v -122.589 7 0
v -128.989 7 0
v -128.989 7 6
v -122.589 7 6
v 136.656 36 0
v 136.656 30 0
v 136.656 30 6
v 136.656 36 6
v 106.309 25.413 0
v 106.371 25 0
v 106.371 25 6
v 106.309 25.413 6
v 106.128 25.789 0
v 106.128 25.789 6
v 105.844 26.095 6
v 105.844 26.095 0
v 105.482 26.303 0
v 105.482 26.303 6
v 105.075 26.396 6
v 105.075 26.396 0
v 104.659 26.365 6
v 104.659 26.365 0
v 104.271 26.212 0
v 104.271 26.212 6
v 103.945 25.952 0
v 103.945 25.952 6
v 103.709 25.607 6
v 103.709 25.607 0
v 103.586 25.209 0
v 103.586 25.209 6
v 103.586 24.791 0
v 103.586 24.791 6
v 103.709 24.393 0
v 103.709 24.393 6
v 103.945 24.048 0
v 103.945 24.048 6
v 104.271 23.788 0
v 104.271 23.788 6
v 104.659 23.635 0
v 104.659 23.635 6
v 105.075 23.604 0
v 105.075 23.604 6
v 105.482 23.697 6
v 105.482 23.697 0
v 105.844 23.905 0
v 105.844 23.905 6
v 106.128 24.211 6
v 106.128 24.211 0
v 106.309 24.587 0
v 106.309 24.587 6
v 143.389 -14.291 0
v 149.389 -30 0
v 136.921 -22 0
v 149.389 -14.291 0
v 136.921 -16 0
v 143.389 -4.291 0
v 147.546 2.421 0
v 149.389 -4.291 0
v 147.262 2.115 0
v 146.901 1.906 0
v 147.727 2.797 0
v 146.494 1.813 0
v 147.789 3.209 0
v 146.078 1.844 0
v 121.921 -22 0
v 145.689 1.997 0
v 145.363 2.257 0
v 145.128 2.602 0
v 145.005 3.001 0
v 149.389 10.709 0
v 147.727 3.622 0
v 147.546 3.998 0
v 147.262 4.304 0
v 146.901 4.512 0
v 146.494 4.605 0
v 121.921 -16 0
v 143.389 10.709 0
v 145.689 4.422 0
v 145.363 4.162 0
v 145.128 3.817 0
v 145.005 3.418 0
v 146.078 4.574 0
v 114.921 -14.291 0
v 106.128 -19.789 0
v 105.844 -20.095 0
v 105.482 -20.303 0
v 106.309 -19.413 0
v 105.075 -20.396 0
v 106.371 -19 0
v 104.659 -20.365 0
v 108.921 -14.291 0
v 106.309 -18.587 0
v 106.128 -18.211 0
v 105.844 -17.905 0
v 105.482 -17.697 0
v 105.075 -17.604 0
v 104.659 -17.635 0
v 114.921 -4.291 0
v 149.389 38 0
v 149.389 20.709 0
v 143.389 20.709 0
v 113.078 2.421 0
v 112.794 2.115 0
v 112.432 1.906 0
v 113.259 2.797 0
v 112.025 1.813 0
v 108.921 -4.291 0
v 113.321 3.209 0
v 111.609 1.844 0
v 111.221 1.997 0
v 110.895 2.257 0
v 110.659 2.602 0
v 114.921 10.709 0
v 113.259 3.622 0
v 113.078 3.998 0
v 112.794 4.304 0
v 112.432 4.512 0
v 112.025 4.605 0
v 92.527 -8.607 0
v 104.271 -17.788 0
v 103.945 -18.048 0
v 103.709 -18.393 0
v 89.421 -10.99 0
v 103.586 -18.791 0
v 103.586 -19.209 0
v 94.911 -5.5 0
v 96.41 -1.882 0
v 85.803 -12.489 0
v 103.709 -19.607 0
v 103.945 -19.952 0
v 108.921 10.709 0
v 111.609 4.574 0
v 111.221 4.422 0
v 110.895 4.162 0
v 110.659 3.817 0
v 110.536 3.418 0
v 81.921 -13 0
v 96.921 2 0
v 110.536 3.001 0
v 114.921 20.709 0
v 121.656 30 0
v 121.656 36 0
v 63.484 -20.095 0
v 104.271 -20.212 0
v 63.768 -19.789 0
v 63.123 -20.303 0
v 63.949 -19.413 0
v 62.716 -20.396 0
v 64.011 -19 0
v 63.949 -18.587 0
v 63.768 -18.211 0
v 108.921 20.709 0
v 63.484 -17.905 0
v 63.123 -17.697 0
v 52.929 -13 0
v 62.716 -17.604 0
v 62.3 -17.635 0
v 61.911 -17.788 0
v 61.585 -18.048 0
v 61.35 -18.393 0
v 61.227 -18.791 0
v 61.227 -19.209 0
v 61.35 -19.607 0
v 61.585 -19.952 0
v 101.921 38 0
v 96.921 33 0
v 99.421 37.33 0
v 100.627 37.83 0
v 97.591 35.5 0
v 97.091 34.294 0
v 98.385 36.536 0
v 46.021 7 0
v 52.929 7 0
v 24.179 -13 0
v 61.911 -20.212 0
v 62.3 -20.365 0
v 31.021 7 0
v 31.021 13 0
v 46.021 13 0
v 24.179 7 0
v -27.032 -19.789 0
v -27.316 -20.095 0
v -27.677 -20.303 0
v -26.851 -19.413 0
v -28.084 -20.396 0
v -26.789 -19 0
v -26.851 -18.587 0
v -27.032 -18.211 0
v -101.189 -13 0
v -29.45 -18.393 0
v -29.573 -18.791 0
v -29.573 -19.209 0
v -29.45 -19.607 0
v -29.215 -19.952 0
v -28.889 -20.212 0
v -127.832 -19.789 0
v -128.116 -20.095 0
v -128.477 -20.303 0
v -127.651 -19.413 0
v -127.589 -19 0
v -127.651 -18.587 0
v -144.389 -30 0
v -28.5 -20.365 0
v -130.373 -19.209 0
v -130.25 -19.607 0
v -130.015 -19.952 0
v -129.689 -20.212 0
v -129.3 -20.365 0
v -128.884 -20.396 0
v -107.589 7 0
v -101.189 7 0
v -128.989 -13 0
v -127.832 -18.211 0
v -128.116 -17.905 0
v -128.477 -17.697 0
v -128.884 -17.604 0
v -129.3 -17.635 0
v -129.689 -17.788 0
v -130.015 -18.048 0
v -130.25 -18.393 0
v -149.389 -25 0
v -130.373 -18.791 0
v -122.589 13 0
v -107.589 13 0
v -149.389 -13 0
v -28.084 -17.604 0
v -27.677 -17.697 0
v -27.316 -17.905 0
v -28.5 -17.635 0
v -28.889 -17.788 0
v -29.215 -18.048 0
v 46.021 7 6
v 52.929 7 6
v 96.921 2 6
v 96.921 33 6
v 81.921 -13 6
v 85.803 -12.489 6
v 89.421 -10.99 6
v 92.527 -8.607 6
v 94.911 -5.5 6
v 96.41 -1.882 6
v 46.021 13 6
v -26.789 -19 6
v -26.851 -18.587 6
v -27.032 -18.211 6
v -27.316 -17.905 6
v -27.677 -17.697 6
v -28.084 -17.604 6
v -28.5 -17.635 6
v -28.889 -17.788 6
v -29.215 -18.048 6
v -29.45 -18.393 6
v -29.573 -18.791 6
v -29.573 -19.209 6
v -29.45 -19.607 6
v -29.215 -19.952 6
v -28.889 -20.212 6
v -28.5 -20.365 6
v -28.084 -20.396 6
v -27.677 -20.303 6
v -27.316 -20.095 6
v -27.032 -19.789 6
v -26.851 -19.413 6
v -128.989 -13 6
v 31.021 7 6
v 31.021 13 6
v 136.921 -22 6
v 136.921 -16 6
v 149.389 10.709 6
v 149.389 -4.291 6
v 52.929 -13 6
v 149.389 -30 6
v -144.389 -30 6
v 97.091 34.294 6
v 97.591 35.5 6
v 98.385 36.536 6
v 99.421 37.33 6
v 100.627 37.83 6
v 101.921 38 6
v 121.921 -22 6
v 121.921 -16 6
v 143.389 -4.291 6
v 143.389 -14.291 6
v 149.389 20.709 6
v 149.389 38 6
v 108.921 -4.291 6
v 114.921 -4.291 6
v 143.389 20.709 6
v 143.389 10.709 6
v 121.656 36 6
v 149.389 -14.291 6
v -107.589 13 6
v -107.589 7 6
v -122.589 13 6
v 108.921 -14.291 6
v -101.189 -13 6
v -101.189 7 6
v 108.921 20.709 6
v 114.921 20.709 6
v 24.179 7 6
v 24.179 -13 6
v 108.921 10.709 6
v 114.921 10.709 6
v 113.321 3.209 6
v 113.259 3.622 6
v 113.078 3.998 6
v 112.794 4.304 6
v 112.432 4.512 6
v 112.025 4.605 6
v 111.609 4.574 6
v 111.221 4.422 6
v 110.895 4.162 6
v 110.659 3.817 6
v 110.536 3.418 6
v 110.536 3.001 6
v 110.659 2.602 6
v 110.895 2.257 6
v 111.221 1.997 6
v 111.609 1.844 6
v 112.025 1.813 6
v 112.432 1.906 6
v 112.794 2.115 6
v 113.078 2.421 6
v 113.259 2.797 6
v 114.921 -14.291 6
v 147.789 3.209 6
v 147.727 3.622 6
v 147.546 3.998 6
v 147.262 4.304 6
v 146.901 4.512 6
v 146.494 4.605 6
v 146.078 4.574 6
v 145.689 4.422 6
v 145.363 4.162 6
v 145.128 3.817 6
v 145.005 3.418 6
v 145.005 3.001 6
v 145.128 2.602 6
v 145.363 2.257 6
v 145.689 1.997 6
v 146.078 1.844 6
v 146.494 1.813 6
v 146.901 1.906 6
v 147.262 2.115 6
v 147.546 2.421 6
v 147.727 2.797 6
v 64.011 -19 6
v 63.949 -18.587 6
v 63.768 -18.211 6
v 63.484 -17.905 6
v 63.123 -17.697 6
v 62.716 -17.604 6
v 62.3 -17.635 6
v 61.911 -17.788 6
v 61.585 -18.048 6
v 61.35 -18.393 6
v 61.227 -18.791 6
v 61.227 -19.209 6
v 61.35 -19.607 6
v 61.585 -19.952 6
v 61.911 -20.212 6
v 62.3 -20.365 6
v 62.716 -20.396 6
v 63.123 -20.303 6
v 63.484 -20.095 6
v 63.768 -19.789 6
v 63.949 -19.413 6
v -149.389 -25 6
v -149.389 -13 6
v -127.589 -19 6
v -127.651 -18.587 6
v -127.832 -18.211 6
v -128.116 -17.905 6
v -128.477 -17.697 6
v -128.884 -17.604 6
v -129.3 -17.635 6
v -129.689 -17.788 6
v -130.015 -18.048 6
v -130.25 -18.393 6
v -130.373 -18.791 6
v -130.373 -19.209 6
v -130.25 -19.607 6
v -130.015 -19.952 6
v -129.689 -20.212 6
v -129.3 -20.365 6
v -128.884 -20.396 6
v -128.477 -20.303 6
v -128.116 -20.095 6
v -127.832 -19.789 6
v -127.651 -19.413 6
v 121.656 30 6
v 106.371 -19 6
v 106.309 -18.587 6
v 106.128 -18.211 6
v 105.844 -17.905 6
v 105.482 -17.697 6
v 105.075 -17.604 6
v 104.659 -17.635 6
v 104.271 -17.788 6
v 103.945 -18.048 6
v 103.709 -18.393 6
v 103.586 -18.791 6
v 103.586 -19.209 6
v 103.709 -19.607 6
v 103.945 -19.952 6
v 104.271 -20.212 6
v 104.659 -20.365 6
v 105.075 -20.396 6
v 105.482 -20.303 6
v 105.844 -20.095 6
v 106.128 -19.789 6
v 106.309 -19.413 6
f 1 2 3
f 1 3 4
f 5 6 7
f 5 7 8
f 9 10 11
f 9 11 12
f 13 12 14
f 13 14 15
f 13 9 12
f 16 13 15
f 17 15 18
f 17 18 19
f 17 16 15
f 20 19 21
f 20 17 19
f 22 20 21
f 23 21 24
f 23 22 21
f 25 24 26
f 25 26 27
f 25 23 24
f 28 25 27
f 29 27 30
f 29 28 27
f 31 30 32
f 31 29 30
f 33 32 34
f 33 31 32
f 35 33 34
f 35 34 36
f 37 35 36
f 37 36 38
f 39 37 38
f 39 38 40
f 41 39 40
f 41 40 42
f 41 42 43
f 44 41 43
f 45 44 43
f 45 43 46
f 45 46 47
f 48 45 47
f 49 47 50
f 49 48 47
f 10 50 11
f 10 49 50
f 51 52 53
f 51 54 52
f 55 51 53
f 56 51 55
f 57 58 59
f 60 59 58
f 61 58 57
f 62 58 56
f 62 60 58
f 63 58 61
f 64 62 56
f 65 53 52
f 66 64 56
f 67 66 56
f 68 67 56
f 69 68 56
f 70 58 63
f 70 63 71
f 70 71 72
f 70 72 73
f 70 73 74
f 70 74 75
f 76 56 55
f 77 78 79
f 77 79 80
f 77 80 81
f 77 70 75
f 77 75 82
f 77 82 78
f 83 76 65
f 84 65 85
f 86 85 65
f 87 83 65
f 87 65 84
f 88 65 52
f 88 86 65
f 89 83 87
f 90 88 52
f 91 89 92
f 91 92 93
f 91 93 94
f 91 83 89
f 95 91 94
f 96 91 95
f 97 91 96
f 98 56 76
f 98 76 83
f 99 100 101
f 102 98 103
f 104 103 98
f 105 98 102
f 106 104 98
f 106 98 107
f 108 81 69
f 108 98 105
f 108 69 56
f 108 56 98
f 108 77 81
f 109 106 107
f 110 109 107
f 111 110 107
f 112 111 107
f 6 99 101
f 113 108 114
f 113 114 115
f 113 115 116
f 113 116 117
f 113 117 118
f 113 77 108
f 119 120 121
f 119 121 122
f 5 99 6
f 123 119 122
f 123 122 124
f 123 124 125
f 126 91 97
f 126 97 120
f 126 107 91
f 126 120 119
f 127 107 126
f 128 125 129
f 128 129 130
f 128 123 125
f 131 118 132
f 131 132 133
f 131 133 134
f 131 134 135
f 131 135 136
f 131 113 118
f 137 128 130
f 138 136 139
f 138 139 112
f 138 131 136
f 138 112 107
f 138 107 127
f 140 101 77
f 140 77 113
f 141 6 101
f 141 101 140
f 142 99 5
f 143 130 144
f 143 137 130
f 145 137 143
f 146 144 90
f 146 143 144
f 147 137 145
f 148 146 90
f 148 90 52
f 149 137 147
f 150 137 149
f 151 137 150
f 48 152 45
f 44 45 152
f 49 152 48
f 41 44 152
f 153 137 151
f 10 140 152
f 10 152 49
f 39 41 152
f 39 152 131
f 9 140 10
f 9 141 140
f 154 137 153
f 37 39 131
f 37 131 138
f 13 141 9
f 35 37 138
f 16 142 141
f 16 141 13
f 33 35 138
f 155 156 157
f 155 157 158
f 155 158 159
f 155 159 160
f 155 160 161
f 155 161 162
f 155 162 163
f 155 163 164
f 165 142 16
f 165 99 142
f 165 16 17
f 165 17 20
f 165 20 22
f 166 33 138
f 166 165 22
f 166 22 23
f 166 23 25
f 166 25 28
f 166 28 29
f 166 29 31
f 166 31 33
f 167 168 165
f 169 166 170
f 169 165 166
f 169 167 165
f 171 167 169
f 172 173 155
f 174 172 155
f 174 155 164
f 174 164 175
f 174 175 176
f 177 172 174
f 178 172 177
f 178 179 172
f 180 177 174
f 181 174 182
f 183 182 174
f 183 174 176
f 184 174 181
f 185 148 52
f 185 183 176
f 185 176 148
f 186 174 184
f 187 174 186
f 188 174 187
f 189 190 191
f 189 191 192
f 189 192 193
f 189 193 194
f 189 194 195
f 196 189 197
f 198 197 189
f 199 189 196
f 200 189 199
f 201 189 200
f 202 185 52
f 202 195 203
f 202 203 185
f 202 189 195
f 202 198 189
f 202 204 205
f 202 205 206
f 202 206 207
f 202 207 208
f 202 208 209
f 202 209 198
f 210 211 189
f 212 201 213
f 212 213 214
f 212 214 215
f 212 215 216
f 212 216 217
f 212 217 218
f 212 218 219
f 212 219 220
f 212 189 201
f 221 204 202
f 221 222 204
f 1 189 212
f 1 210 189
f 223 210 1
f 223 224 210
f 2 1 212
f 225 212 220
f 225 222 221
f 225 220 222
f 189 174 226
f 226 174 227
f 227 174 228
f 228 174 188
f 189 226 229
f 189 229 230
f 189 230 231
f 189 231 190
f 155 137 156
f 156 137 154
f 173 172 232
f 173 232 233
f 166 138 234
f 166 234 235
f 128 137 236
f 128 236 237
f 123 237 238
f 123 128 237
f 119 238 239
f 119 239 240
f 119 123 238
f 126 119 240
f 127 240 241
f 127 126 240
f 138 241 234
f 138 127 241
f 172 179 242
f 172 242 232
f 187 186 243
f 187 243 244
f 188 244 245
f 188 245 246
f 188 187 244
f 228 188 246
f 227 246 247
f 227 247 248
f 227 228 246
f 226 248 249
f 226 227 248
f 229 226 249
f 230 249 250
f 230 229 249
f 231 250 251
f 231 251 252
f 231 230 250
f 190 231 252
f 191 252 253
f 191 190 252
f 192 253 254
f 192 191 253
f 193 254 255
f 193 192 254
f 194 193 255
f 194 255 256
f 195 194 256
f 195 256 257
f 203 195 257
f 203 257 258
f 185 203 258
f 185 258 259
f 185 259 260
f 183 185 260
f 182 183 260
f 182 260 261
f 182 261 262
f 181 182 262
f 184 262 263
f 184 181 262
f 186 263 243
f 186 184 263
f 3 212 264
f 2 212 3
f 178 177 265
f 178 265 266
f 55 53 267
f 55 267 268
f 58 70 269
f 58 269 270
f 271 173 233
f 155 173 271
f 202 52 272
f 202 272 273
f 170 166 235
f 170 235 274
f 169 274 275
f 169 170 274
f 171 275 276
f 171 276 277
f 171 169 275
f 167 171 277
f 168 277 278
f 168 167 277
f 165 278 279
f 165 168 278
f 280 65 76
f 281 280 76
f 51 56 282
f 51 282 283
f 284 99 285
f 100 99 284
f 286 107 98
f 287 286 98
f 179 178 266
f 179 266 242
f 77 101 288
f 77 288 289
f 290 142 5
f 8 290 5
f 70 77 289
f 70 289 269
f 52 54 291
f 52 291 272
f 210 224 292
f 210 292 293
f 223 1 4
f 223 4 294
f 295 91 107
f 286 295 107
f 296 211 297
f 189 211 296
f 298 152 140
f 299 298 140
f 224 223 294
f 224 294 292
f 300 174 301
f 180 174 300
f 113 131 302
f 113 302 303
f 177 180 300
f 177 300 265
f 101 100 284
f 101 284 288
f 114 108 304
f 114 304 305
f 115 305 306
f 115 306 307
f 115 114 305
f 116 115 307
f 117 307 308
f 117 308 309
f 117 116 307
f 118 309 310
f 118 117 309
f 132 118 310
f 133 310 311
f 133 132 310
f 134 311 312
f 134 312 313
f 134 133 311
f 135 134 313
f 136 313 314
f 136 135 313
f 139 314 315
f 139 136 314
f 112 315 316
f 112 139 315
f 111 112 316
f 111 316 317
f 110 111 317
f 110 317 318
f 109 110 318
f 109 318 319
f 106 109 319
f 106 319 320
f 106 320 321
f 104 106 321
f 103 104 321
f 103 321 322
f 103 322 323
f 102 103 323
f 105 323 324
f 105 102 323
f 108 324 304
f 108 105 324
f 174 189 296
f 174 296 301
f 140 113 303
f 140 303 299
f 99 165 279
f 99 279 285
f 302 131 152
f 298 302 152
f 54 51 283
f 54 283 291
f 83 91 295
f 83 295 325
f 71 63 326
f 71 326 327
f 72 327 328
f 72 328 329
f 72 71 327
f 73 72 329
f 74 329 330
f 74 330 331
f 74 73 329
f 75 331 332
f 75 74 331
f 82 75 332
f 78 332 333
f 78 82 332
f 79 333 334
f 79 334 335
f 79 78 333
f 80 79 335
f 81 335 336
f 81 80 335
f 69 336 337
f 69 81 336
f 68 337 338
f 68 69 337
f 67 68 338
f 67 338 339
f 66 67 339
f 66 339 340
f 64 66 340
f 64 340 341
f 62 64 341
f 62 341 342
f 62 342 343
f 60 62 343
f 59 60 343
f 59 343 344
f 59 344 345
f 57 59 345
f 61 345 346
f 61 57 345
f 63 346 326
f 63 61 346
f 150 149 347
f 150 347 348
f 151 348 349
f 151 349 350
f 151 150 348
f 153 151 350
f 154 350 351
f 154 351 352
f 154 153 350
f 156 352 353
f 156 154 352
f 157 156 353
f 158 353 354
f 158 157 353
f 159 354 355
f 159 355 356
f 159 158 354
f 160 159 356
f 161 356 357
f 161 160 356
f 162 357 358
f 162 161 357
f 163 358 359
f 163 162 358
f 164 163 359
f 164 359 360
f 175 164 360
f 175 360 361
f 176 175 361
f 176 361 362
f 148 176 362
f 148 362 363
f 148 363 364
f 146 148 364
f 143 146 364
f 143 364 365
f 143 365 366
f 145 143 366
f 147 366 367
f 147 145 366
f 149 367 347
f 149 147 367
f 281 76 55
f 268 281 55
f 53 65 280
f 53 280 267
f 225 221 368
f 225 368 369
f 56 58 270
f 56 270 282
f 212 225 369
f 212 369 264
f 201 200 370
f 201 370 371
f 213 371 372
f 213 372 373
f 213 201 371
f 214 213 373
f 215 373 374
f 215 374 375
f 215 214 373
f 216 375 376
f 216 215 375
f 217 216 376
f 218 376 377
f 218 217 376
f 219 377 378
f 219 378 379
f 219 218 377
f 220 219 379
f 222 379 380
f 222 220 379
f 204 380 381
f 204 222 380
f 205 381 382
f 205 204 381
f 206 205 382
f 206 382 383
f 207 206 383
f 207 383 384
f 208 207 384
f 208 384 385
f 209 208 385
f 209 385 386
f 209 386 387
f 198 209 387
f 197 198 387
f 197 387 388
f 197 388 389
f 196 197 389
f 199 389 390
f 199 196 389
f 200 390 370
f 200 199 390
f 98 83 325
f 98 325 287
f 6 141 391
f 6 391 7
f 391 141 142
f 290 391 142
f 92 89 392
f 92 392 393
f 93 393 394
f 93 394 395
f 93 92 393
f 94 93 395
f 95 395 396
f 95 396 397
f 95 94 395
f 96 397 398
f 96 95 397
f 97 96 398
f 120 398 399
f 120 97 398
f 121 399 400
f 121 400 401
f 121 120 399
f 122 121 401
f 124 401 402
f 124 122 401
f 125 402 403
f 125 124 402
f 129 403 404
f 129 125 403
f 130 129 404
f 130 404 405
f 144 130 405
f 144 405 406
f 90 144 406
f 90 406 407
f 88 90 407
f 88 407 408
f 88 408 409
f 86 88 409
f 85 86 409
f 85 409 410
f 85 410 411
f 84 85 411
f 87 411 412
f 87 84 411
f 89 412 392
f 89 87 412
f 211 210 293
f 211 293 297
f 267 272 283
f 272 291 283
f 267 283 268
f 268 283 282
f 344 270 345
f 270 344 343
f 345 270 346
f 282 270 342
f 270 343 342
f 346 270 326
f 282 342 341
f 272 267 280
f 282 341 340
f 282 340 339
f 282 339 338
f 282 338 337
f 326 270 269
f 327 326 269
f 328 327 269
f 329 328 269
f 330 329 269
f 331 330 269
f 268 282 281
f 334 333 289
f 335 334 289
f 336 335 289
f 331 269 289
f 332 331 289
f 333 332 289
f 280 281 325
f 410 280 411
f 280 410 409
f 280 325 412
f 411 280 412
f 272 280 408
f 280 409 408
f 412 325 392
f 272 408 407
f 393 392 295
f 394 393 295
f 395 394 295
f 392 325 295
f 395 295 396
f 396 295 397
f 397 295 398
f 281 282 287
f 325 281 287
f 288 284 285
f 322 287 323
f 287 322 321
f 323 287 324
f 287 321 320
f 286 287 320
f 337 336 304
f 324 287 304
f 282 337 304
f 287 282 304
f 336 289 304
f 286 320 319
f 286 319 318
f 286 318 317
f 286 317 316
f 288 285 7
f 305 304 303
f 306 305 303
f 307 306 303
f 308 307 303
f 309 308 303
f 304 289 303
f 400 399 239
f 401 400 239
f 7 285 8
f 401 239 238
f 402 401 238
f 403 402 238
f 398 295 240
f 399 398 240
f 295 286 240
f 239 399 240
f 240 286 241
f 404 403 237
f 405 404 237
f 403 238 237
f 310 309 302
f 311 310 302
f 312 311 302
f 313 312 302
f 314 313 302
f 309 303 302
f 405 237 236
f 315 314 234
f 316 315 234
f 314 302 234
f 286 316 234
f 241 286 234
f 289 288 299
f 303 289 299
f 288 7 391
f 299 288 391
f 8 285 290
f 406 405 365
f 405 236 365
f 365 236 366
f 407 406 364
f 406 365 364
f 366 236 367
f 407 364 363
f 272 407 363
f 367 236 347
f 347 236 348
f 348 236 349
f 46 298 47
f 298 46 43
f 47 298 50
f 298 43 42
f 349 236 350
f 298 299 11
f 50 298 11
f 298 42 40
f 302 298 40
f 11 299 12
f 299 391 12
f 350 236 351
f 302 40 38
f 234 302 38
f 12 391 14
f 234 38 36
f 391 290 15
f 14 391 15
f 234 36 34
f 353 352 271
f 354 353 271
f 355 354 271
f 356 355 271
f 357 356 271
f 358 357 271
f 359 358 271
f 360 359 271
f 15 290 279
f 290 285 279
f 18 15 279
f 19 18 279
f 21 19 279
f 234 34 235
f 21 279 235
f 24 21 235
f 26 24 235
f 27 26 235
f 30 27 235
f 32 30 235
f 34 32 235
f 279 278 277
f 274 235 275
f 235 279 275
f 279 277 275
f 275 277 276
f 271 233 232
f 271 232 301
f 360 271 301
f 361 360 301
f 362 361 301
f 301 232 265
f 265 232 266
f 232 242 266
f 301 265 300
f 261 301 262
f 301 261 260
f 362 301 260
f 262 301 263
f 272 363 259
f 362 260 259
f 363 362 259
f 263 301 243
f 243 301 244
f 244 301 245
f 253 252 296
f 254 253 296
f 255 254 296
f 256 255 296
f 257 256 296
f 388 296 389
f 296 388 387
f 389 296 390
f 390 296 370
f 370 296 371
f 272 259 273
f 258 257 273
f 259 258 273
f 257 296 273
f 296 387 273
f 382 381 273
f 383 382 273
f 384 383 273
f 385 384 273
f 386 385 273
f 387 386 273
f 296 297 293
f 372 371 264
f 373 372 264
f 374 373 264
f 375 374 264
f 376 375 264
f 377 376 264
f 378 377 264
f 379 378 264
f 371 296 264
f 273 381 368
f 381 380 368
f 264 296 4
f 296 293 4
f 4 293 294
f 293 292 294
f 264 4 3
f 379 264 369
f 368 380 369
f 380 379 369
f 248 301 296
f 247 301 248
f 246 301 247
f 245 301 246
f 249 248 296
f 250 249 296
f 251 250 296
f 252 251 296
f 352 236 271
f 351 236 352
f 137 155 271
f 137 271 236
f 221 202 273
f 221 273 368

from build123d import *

# Parameters (mm, degrees)
SKETCH_1_R      = 1.4
SKETCH_1_W      = 15
SKETCH_1_H      = 6
SKETCH_1_W_2    = 6
SKETCH_1_H_2    = 10
EXTRUDE_1_DEPTH = 6


with BuildPart() as part:
    # Эскиз1 → Бобышка-Вытянуть1 (new body)
    with BuildSketch(Plane.XY):
        with BuildLine():
            Line((96.920798757, 2), (96.920798757, 25))
            Line((96.920798757, 25), (96.920798757, 33))
            ThreePointArc((96.920798757, 33), (98.385264851, 36.535533906), (101.920798757, 38))
            Line((101.920798757, 38), (149.389201243, 38))
            Line((149.389201243, 38), (149.389201243, 30))
            Line((149.389201243, 30), (149.389201243, 20.709265489))
            Line((149.389201243, 20.709265489), (143.389201243, 20.709265489))
            Line((143.389201243, 20.709265489), (143.389201243, 10.709265489))
            Line((143.389201243, 10.709265489), (149.389201243, 10.709265489))
            Line((149.389201243, 10.709265489), (149.389201243, -4.290734511))
            Line((149.389201243, -4.290734511), (143.389201243, -4.290734511))
            Line((143.389201243, -4.290734511), (143.389201243, -14.290734511))
            Line((143.389201243, -14.290734511), (149.389201243, -14.290734511))
            Line((149.389201243, -14.290734511), (149.389201243, -30))
            Line((149.389201243, -30), (-144.389201243, -30))
            Line((-144.389201243, -30), (-149.389201243, -25))
            Line((-149.389201243, -25), (-149.389201243, -13))
            Line((-149.389201243, -13), (-128.98858016, -13))
            Line((-128.98858016, -13), (-128.98858016, 7))
            Line((-128.98858016, 7), (-122.58858016, 7))
            Line((-122.58858016, 7), (-122.58858016, 13))
            Line((-122.58858016, 13), (-107.58858016, 13))
            Line((-107.58858016, 13), (-107.58858016, 7))
            Line((-107.58858016, 7), (-101.18858016, 7))
            Line((-101.18858016, 7), (-101.18858016, -13))
            Line((-101.18858016, -13), (24.179035237, -13))
            Line((24.179035237, -13), (24.179035237, 7))
            Line((24.179035237, 7), (31.021419837, 7))
            Line((31.021419837, 7), (31.021419837, 13))
            Line((31.021419837, 13), (46.021419837, 13))
            Line((46.021419837, 13), (46.021419837, 7))
            Line((46.021419837, 7), (52.929060017, 7))
            Line((52.929060017, 7), (52.929060017, -13))
            Line((52.929060017, -13), (81.920798757, -13))
            ThreePointArc((81.920798757, -13), (92.527400475, -8.606601718), (96.920798757, 2))
        make_face()
        with Locations((104.970798757, -19)):
            Circle(SKETCH_1_R, mode=Mode.SUBTRACT)
        with Locations((104.970798757, 25)):
            Circle(SKETCH_1_R, mode=Mode.SUBTRACT)
        with Locations((111.920798757, 3.209265489)):
            Circle(SKETCH_1_R, mode=Mode.SUBTRACT)
        with Locations((146.389201243, 3.209265489)):
            Circle(SKETCH_1_R, mode=Mode.SUBTRACT)
        with Locations((-128.98858016, -19)):
            Circle(SKETCH_1_R, mode=Mode.SUBTRACT)
        with Locations((-28.18858016, -19)):
            Circle(SKETCH_1_R, mode=Mode.SUBTRACT)
        with Locations((62.61141984, -19)):
            Circle(SKETCH_1_R, mode=Mode.SUBTRACT)
        with Locations((129.420798757, -19)):
            Rectangle(SKETCH_1_W, SKETCH_1_H, mode=Mode.SUBTRACT)
        with Locations((111.920798757, 15.709265489)):
            Rectangle(SKETCH_1_W_2, SKETCH_1_H_2, mode=Mode.SUBTRACT)
        with Locations((111.920798757, -9.290734511)):
            Rectangle(SKETCH_1_W_2, SKETCH_1_H_2, mode=Mode.SUBTRACT)
        with Locations((129.155798757, 33)):
            Rectangle(SKETCH_1_W, SKETCH_1_H, mode=Mode.SUBTRACT)
    extrude(amount=EXTRUDE_1_DEPTH)


solid = part.part
